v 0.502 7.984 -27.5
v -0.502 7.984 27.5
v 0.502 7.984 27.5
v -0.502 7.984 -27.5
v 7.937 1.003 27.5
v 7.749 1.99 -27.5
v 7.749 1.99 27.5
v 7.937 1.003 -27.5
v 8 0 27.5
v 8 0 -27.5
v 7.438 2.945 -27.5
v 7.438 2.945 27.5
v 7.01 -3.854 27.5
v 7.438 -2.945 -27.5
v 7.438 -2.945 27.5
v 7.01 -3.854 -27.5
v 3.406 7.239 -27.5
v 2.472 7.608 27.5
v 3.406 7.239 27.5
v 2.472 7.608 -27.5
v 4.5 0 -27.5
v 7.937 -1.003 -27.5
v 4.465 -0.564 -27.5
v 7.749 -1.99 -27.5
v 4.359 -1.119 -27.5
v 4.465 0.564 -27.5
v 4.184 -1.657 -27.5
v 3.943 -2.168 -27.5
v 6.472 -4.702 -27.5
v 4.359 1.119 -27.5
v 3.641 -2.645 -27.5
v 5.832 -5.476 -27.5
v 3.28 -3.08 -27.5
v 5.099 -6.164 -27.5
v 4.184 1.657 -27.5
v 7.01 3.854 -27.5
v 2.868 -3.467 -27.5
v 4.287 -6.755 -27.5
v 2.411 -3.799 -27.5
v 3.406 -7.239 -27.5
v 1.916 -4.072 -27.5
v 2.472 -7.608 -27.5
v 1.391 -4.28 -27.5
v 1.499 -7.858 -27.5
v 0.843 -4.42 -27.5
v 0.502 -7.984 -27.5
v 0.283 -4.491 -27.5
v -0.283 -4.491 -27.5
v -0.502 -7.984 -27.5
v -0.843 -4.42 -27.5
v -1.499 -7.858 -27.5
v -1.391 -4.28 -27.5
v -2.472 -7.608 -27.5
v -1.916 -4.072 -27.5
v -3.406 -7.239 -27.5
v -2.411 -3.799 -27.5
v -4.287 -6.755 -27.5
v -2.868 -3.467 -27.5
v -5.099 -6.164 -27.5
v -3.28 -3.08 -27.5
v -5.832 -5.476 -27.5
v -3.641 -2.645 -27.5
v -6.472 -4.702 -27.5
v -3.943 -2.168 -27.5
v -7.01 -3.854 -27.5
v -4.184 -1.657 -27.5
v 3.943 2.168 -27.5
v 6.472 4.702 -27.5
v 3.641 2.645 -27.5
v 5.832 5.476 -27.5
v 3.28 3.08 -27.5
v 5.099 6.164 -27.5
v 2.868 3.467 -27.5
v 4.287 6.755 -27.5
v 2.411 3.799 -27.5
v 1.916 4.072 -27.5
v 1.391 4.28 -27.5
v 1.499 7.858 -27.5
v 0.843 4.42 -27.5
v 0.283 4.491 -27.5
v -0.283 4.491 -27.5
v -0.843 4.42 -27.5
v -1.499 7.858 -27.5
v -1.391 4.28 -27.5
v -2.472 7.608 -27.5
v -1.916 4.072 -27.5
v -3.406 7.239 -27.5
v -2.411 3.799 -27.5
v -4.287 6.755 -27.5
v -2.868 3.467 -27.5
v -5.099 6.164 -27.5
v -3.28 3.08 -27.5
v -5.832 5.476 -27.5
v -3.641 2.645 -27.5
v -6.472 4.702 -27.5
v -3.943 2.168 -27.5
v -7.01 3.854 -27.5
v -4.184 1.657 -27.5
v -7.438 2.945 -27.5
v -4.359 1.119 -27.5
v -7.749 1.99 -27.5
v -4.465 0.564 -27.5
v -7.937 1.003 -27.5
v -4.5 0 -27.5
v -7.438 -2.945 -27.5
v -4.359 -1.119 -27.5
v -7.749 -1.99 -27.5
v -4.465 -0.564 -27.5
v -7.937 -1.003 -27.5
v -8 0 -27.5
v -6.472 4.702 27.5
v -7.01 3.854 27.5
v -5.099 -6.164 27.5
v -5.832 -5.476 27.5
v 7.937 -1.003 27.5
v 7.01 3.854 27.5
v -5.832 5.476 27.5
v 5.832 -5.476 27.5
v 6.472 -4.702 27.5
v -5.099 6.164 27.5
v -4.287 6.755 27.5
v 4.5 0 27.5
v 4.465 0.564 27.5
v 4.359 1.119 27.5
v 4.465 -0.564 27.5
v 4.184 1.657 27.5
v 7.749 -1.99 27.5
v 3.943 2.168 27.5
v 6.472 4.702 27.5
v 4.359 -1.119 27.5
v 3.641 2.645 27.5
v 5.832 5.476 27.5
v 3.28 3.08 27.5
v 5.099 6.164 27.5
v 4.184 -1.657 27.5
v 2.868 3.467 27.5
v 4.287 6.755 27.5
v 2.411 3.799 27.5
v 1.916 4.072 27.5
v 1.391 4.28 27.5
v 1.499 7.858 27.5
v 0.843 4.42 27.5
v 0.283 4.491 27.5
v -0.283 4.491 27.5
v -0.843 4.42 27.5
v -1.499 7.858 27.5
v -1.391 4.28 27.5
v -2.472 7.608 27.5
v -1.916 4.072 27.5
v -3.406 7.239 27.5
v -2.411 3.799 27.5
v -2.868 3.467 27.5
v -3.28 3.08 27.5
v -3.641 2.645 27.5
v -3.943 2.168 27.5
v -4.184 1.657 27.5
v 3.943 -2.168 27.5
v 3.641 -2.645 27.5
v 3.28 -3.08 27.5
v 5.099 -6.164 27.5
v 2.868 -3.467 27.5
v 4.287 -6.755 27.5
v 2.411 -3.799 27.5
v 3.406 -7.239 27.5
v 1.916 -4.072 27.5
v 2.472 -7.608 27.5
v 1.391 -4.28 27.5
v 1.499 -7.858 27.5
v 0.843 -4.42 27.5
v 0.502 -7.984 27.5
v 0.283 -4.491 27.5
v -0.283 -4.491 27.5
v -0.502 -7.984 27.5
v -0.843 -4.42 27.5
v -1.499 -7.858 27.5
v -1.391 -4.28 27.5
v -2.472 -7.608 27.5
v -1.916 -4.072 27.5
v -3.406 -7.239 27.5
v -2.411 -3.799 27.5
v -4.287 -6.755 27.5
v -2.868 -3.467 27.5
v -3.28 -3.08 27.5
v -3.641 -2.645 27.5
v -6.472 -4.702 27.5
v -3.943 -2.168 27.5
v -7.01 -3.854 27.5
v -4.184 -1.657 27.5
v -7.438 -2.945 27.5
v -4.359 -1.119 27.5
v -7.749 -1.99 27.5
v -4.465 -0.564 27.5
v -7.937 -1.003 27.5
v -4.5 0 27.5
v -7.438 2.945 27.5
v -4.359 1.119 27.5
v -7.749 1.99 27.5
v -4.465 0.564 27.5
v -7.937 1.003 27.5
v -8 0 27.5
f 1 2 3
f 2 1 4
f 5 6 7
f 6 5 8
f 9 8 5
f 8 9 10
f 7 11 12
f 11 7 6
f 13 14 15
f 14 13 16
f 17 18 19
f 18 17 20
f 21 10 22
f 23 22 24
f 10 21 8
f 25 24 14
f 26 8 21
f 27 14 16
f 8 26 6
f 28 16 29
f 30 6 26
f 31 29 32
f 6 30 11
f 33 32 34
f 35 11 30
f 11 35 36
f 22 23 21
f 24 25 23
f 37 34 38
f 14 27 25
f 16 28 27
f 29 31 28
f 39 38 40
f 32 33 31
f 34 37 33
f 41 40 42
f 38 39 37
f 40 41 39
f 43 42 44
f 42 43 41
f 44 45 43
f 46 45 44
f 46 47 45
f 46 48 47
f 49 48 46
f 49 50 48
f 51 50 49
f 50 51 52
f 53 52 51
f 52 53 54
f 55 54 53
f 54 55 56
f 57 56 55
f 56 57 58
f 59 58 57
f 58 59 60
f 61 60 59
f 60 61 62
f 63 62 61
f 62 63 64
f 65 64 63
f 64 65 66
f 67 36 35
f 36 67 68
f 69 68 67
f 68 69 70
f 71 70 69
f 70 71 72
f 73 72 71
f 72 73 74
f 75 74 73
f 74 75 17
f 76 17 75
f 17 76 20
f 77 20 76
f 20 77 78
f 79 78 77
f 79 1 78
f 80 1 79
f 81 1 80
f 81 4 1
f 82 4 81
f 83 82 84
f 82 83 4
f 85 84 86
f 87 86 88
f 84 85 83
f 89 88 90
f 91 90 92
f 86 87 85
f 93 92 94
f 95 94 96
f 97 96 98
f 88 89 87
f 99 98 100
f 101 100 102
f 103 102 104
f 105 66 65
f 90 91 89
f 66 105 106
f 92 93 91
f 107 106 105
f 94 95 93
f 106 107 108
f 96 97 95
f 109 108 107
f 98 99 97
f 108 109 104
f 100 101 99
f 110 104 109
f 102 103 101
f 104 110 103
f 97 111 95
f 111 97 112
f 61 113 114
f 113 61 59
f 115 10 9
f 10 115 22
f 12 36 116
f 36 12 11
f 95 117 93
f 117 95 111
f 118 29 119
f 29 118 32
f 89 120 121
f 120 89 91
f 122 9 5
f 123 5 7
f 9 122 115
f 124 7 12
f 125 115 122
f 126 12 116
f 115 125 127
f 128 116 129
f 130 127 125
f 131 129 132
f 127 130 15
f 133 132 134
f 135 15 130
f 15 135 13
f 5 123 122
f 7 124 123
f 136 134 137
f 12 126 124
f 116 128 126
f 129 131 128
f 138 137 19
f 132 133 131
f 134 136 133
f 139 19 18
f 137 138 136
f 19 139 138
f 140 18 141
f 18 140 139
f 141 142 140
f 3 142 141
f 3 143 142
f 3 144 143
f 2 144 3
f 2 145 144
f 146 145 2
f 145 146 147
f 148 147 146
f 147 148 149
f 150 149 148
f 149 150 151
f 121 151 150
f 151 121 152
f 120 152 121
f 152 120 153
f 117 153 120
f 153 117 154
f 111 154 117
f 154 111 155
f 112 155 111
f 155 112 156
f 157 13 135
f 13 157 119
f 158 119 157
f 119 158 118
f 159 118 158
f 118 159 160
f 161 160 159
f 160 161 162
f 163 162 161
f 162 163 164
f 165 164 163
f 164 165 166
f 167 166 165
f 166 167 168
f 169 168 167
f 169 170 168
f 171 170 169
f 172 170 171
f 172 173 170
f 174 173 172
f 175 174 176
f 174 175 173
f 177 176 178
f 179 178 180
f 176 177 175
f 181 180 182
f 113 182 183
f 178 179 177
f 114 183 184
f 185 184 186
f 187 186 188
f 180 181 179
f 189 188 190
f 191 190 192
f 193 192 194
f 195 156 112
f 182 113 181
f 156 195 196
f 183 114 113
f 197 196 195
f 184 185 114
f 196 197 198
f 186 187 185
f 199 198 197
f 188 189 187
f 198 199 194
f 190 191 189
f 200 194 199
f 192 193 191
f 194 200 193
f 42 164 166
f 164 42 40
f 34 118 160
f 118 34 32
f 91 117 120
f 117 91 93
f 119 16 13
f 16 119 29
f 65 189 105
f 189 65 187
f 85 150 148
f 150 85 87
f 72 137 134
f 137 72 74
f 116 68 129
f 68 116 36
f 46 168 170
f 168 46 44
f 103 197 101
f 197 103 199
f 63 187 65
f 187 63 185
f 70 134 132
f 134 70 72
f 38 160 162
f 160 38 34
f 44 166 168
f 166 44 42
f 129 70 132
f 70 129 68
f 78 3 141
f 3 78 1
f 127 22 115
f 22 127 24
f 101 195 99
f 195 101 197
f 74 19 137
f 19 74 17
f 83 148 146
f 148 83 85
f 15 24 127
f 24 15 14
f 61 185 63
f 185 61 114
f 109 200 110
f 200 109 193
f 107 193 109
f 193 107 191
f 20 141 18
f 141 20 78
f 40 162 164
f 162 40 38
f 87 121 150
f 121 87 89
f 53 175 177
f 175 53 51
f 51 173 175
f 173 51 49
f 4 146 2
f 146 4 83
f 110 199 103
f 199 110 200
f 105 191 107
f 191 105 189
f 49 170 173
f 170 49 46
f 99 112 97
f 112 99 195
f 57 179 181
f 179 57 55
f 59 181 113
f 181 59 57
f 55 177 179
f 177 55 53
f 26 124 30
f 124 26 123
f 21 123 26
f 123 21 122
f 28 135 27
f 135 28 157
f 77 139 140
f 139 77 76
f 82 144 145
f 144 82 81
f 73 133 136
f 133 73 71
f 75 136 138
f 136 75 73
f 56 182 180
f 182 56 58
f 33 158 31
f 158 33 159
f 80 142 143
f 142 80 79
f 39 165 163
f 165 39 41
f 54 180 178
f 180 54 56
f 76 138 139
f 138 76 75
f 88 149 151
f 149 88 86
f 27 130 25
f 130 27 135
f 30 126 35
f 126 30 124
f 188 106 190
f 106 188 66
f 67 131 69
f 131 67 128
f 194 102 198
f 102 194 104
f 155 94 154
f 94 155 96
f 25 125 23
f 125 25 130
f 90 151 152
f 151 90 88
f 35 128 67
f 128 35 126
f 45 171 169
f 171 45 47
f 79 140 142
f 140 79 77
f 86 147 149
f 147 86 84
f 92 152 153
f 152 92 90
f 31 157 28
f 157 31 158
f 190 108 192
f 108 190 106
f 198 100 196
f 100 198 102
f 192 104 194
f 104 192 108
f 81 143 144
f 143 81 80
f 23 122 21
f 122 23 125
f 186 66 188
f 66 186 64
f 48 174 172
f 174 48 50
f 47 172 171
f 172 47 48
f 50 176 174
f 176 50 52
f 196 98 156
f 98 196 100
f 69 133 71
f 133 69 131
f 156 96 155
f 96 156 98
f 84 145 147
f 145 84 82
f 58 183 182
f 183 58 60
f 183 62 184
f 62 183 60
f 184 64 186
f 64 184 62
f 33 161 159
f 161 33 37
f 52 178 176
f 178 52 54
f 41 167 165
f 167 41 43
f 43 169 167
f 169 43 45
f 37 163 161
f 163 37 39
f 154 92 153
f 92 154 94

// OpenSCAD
$fn = 50;


difference() {
	union() {
		translate(v = [0, 0, -27.5000000000]) {
			cylinder(h = 55, r = 8.0000000000);
		}
	}
	union() {
		translate(v = [0, 0, -100.0000000000]) {
			cylinder(h = 200, r = 4.5000000000);
		}
	}
}
